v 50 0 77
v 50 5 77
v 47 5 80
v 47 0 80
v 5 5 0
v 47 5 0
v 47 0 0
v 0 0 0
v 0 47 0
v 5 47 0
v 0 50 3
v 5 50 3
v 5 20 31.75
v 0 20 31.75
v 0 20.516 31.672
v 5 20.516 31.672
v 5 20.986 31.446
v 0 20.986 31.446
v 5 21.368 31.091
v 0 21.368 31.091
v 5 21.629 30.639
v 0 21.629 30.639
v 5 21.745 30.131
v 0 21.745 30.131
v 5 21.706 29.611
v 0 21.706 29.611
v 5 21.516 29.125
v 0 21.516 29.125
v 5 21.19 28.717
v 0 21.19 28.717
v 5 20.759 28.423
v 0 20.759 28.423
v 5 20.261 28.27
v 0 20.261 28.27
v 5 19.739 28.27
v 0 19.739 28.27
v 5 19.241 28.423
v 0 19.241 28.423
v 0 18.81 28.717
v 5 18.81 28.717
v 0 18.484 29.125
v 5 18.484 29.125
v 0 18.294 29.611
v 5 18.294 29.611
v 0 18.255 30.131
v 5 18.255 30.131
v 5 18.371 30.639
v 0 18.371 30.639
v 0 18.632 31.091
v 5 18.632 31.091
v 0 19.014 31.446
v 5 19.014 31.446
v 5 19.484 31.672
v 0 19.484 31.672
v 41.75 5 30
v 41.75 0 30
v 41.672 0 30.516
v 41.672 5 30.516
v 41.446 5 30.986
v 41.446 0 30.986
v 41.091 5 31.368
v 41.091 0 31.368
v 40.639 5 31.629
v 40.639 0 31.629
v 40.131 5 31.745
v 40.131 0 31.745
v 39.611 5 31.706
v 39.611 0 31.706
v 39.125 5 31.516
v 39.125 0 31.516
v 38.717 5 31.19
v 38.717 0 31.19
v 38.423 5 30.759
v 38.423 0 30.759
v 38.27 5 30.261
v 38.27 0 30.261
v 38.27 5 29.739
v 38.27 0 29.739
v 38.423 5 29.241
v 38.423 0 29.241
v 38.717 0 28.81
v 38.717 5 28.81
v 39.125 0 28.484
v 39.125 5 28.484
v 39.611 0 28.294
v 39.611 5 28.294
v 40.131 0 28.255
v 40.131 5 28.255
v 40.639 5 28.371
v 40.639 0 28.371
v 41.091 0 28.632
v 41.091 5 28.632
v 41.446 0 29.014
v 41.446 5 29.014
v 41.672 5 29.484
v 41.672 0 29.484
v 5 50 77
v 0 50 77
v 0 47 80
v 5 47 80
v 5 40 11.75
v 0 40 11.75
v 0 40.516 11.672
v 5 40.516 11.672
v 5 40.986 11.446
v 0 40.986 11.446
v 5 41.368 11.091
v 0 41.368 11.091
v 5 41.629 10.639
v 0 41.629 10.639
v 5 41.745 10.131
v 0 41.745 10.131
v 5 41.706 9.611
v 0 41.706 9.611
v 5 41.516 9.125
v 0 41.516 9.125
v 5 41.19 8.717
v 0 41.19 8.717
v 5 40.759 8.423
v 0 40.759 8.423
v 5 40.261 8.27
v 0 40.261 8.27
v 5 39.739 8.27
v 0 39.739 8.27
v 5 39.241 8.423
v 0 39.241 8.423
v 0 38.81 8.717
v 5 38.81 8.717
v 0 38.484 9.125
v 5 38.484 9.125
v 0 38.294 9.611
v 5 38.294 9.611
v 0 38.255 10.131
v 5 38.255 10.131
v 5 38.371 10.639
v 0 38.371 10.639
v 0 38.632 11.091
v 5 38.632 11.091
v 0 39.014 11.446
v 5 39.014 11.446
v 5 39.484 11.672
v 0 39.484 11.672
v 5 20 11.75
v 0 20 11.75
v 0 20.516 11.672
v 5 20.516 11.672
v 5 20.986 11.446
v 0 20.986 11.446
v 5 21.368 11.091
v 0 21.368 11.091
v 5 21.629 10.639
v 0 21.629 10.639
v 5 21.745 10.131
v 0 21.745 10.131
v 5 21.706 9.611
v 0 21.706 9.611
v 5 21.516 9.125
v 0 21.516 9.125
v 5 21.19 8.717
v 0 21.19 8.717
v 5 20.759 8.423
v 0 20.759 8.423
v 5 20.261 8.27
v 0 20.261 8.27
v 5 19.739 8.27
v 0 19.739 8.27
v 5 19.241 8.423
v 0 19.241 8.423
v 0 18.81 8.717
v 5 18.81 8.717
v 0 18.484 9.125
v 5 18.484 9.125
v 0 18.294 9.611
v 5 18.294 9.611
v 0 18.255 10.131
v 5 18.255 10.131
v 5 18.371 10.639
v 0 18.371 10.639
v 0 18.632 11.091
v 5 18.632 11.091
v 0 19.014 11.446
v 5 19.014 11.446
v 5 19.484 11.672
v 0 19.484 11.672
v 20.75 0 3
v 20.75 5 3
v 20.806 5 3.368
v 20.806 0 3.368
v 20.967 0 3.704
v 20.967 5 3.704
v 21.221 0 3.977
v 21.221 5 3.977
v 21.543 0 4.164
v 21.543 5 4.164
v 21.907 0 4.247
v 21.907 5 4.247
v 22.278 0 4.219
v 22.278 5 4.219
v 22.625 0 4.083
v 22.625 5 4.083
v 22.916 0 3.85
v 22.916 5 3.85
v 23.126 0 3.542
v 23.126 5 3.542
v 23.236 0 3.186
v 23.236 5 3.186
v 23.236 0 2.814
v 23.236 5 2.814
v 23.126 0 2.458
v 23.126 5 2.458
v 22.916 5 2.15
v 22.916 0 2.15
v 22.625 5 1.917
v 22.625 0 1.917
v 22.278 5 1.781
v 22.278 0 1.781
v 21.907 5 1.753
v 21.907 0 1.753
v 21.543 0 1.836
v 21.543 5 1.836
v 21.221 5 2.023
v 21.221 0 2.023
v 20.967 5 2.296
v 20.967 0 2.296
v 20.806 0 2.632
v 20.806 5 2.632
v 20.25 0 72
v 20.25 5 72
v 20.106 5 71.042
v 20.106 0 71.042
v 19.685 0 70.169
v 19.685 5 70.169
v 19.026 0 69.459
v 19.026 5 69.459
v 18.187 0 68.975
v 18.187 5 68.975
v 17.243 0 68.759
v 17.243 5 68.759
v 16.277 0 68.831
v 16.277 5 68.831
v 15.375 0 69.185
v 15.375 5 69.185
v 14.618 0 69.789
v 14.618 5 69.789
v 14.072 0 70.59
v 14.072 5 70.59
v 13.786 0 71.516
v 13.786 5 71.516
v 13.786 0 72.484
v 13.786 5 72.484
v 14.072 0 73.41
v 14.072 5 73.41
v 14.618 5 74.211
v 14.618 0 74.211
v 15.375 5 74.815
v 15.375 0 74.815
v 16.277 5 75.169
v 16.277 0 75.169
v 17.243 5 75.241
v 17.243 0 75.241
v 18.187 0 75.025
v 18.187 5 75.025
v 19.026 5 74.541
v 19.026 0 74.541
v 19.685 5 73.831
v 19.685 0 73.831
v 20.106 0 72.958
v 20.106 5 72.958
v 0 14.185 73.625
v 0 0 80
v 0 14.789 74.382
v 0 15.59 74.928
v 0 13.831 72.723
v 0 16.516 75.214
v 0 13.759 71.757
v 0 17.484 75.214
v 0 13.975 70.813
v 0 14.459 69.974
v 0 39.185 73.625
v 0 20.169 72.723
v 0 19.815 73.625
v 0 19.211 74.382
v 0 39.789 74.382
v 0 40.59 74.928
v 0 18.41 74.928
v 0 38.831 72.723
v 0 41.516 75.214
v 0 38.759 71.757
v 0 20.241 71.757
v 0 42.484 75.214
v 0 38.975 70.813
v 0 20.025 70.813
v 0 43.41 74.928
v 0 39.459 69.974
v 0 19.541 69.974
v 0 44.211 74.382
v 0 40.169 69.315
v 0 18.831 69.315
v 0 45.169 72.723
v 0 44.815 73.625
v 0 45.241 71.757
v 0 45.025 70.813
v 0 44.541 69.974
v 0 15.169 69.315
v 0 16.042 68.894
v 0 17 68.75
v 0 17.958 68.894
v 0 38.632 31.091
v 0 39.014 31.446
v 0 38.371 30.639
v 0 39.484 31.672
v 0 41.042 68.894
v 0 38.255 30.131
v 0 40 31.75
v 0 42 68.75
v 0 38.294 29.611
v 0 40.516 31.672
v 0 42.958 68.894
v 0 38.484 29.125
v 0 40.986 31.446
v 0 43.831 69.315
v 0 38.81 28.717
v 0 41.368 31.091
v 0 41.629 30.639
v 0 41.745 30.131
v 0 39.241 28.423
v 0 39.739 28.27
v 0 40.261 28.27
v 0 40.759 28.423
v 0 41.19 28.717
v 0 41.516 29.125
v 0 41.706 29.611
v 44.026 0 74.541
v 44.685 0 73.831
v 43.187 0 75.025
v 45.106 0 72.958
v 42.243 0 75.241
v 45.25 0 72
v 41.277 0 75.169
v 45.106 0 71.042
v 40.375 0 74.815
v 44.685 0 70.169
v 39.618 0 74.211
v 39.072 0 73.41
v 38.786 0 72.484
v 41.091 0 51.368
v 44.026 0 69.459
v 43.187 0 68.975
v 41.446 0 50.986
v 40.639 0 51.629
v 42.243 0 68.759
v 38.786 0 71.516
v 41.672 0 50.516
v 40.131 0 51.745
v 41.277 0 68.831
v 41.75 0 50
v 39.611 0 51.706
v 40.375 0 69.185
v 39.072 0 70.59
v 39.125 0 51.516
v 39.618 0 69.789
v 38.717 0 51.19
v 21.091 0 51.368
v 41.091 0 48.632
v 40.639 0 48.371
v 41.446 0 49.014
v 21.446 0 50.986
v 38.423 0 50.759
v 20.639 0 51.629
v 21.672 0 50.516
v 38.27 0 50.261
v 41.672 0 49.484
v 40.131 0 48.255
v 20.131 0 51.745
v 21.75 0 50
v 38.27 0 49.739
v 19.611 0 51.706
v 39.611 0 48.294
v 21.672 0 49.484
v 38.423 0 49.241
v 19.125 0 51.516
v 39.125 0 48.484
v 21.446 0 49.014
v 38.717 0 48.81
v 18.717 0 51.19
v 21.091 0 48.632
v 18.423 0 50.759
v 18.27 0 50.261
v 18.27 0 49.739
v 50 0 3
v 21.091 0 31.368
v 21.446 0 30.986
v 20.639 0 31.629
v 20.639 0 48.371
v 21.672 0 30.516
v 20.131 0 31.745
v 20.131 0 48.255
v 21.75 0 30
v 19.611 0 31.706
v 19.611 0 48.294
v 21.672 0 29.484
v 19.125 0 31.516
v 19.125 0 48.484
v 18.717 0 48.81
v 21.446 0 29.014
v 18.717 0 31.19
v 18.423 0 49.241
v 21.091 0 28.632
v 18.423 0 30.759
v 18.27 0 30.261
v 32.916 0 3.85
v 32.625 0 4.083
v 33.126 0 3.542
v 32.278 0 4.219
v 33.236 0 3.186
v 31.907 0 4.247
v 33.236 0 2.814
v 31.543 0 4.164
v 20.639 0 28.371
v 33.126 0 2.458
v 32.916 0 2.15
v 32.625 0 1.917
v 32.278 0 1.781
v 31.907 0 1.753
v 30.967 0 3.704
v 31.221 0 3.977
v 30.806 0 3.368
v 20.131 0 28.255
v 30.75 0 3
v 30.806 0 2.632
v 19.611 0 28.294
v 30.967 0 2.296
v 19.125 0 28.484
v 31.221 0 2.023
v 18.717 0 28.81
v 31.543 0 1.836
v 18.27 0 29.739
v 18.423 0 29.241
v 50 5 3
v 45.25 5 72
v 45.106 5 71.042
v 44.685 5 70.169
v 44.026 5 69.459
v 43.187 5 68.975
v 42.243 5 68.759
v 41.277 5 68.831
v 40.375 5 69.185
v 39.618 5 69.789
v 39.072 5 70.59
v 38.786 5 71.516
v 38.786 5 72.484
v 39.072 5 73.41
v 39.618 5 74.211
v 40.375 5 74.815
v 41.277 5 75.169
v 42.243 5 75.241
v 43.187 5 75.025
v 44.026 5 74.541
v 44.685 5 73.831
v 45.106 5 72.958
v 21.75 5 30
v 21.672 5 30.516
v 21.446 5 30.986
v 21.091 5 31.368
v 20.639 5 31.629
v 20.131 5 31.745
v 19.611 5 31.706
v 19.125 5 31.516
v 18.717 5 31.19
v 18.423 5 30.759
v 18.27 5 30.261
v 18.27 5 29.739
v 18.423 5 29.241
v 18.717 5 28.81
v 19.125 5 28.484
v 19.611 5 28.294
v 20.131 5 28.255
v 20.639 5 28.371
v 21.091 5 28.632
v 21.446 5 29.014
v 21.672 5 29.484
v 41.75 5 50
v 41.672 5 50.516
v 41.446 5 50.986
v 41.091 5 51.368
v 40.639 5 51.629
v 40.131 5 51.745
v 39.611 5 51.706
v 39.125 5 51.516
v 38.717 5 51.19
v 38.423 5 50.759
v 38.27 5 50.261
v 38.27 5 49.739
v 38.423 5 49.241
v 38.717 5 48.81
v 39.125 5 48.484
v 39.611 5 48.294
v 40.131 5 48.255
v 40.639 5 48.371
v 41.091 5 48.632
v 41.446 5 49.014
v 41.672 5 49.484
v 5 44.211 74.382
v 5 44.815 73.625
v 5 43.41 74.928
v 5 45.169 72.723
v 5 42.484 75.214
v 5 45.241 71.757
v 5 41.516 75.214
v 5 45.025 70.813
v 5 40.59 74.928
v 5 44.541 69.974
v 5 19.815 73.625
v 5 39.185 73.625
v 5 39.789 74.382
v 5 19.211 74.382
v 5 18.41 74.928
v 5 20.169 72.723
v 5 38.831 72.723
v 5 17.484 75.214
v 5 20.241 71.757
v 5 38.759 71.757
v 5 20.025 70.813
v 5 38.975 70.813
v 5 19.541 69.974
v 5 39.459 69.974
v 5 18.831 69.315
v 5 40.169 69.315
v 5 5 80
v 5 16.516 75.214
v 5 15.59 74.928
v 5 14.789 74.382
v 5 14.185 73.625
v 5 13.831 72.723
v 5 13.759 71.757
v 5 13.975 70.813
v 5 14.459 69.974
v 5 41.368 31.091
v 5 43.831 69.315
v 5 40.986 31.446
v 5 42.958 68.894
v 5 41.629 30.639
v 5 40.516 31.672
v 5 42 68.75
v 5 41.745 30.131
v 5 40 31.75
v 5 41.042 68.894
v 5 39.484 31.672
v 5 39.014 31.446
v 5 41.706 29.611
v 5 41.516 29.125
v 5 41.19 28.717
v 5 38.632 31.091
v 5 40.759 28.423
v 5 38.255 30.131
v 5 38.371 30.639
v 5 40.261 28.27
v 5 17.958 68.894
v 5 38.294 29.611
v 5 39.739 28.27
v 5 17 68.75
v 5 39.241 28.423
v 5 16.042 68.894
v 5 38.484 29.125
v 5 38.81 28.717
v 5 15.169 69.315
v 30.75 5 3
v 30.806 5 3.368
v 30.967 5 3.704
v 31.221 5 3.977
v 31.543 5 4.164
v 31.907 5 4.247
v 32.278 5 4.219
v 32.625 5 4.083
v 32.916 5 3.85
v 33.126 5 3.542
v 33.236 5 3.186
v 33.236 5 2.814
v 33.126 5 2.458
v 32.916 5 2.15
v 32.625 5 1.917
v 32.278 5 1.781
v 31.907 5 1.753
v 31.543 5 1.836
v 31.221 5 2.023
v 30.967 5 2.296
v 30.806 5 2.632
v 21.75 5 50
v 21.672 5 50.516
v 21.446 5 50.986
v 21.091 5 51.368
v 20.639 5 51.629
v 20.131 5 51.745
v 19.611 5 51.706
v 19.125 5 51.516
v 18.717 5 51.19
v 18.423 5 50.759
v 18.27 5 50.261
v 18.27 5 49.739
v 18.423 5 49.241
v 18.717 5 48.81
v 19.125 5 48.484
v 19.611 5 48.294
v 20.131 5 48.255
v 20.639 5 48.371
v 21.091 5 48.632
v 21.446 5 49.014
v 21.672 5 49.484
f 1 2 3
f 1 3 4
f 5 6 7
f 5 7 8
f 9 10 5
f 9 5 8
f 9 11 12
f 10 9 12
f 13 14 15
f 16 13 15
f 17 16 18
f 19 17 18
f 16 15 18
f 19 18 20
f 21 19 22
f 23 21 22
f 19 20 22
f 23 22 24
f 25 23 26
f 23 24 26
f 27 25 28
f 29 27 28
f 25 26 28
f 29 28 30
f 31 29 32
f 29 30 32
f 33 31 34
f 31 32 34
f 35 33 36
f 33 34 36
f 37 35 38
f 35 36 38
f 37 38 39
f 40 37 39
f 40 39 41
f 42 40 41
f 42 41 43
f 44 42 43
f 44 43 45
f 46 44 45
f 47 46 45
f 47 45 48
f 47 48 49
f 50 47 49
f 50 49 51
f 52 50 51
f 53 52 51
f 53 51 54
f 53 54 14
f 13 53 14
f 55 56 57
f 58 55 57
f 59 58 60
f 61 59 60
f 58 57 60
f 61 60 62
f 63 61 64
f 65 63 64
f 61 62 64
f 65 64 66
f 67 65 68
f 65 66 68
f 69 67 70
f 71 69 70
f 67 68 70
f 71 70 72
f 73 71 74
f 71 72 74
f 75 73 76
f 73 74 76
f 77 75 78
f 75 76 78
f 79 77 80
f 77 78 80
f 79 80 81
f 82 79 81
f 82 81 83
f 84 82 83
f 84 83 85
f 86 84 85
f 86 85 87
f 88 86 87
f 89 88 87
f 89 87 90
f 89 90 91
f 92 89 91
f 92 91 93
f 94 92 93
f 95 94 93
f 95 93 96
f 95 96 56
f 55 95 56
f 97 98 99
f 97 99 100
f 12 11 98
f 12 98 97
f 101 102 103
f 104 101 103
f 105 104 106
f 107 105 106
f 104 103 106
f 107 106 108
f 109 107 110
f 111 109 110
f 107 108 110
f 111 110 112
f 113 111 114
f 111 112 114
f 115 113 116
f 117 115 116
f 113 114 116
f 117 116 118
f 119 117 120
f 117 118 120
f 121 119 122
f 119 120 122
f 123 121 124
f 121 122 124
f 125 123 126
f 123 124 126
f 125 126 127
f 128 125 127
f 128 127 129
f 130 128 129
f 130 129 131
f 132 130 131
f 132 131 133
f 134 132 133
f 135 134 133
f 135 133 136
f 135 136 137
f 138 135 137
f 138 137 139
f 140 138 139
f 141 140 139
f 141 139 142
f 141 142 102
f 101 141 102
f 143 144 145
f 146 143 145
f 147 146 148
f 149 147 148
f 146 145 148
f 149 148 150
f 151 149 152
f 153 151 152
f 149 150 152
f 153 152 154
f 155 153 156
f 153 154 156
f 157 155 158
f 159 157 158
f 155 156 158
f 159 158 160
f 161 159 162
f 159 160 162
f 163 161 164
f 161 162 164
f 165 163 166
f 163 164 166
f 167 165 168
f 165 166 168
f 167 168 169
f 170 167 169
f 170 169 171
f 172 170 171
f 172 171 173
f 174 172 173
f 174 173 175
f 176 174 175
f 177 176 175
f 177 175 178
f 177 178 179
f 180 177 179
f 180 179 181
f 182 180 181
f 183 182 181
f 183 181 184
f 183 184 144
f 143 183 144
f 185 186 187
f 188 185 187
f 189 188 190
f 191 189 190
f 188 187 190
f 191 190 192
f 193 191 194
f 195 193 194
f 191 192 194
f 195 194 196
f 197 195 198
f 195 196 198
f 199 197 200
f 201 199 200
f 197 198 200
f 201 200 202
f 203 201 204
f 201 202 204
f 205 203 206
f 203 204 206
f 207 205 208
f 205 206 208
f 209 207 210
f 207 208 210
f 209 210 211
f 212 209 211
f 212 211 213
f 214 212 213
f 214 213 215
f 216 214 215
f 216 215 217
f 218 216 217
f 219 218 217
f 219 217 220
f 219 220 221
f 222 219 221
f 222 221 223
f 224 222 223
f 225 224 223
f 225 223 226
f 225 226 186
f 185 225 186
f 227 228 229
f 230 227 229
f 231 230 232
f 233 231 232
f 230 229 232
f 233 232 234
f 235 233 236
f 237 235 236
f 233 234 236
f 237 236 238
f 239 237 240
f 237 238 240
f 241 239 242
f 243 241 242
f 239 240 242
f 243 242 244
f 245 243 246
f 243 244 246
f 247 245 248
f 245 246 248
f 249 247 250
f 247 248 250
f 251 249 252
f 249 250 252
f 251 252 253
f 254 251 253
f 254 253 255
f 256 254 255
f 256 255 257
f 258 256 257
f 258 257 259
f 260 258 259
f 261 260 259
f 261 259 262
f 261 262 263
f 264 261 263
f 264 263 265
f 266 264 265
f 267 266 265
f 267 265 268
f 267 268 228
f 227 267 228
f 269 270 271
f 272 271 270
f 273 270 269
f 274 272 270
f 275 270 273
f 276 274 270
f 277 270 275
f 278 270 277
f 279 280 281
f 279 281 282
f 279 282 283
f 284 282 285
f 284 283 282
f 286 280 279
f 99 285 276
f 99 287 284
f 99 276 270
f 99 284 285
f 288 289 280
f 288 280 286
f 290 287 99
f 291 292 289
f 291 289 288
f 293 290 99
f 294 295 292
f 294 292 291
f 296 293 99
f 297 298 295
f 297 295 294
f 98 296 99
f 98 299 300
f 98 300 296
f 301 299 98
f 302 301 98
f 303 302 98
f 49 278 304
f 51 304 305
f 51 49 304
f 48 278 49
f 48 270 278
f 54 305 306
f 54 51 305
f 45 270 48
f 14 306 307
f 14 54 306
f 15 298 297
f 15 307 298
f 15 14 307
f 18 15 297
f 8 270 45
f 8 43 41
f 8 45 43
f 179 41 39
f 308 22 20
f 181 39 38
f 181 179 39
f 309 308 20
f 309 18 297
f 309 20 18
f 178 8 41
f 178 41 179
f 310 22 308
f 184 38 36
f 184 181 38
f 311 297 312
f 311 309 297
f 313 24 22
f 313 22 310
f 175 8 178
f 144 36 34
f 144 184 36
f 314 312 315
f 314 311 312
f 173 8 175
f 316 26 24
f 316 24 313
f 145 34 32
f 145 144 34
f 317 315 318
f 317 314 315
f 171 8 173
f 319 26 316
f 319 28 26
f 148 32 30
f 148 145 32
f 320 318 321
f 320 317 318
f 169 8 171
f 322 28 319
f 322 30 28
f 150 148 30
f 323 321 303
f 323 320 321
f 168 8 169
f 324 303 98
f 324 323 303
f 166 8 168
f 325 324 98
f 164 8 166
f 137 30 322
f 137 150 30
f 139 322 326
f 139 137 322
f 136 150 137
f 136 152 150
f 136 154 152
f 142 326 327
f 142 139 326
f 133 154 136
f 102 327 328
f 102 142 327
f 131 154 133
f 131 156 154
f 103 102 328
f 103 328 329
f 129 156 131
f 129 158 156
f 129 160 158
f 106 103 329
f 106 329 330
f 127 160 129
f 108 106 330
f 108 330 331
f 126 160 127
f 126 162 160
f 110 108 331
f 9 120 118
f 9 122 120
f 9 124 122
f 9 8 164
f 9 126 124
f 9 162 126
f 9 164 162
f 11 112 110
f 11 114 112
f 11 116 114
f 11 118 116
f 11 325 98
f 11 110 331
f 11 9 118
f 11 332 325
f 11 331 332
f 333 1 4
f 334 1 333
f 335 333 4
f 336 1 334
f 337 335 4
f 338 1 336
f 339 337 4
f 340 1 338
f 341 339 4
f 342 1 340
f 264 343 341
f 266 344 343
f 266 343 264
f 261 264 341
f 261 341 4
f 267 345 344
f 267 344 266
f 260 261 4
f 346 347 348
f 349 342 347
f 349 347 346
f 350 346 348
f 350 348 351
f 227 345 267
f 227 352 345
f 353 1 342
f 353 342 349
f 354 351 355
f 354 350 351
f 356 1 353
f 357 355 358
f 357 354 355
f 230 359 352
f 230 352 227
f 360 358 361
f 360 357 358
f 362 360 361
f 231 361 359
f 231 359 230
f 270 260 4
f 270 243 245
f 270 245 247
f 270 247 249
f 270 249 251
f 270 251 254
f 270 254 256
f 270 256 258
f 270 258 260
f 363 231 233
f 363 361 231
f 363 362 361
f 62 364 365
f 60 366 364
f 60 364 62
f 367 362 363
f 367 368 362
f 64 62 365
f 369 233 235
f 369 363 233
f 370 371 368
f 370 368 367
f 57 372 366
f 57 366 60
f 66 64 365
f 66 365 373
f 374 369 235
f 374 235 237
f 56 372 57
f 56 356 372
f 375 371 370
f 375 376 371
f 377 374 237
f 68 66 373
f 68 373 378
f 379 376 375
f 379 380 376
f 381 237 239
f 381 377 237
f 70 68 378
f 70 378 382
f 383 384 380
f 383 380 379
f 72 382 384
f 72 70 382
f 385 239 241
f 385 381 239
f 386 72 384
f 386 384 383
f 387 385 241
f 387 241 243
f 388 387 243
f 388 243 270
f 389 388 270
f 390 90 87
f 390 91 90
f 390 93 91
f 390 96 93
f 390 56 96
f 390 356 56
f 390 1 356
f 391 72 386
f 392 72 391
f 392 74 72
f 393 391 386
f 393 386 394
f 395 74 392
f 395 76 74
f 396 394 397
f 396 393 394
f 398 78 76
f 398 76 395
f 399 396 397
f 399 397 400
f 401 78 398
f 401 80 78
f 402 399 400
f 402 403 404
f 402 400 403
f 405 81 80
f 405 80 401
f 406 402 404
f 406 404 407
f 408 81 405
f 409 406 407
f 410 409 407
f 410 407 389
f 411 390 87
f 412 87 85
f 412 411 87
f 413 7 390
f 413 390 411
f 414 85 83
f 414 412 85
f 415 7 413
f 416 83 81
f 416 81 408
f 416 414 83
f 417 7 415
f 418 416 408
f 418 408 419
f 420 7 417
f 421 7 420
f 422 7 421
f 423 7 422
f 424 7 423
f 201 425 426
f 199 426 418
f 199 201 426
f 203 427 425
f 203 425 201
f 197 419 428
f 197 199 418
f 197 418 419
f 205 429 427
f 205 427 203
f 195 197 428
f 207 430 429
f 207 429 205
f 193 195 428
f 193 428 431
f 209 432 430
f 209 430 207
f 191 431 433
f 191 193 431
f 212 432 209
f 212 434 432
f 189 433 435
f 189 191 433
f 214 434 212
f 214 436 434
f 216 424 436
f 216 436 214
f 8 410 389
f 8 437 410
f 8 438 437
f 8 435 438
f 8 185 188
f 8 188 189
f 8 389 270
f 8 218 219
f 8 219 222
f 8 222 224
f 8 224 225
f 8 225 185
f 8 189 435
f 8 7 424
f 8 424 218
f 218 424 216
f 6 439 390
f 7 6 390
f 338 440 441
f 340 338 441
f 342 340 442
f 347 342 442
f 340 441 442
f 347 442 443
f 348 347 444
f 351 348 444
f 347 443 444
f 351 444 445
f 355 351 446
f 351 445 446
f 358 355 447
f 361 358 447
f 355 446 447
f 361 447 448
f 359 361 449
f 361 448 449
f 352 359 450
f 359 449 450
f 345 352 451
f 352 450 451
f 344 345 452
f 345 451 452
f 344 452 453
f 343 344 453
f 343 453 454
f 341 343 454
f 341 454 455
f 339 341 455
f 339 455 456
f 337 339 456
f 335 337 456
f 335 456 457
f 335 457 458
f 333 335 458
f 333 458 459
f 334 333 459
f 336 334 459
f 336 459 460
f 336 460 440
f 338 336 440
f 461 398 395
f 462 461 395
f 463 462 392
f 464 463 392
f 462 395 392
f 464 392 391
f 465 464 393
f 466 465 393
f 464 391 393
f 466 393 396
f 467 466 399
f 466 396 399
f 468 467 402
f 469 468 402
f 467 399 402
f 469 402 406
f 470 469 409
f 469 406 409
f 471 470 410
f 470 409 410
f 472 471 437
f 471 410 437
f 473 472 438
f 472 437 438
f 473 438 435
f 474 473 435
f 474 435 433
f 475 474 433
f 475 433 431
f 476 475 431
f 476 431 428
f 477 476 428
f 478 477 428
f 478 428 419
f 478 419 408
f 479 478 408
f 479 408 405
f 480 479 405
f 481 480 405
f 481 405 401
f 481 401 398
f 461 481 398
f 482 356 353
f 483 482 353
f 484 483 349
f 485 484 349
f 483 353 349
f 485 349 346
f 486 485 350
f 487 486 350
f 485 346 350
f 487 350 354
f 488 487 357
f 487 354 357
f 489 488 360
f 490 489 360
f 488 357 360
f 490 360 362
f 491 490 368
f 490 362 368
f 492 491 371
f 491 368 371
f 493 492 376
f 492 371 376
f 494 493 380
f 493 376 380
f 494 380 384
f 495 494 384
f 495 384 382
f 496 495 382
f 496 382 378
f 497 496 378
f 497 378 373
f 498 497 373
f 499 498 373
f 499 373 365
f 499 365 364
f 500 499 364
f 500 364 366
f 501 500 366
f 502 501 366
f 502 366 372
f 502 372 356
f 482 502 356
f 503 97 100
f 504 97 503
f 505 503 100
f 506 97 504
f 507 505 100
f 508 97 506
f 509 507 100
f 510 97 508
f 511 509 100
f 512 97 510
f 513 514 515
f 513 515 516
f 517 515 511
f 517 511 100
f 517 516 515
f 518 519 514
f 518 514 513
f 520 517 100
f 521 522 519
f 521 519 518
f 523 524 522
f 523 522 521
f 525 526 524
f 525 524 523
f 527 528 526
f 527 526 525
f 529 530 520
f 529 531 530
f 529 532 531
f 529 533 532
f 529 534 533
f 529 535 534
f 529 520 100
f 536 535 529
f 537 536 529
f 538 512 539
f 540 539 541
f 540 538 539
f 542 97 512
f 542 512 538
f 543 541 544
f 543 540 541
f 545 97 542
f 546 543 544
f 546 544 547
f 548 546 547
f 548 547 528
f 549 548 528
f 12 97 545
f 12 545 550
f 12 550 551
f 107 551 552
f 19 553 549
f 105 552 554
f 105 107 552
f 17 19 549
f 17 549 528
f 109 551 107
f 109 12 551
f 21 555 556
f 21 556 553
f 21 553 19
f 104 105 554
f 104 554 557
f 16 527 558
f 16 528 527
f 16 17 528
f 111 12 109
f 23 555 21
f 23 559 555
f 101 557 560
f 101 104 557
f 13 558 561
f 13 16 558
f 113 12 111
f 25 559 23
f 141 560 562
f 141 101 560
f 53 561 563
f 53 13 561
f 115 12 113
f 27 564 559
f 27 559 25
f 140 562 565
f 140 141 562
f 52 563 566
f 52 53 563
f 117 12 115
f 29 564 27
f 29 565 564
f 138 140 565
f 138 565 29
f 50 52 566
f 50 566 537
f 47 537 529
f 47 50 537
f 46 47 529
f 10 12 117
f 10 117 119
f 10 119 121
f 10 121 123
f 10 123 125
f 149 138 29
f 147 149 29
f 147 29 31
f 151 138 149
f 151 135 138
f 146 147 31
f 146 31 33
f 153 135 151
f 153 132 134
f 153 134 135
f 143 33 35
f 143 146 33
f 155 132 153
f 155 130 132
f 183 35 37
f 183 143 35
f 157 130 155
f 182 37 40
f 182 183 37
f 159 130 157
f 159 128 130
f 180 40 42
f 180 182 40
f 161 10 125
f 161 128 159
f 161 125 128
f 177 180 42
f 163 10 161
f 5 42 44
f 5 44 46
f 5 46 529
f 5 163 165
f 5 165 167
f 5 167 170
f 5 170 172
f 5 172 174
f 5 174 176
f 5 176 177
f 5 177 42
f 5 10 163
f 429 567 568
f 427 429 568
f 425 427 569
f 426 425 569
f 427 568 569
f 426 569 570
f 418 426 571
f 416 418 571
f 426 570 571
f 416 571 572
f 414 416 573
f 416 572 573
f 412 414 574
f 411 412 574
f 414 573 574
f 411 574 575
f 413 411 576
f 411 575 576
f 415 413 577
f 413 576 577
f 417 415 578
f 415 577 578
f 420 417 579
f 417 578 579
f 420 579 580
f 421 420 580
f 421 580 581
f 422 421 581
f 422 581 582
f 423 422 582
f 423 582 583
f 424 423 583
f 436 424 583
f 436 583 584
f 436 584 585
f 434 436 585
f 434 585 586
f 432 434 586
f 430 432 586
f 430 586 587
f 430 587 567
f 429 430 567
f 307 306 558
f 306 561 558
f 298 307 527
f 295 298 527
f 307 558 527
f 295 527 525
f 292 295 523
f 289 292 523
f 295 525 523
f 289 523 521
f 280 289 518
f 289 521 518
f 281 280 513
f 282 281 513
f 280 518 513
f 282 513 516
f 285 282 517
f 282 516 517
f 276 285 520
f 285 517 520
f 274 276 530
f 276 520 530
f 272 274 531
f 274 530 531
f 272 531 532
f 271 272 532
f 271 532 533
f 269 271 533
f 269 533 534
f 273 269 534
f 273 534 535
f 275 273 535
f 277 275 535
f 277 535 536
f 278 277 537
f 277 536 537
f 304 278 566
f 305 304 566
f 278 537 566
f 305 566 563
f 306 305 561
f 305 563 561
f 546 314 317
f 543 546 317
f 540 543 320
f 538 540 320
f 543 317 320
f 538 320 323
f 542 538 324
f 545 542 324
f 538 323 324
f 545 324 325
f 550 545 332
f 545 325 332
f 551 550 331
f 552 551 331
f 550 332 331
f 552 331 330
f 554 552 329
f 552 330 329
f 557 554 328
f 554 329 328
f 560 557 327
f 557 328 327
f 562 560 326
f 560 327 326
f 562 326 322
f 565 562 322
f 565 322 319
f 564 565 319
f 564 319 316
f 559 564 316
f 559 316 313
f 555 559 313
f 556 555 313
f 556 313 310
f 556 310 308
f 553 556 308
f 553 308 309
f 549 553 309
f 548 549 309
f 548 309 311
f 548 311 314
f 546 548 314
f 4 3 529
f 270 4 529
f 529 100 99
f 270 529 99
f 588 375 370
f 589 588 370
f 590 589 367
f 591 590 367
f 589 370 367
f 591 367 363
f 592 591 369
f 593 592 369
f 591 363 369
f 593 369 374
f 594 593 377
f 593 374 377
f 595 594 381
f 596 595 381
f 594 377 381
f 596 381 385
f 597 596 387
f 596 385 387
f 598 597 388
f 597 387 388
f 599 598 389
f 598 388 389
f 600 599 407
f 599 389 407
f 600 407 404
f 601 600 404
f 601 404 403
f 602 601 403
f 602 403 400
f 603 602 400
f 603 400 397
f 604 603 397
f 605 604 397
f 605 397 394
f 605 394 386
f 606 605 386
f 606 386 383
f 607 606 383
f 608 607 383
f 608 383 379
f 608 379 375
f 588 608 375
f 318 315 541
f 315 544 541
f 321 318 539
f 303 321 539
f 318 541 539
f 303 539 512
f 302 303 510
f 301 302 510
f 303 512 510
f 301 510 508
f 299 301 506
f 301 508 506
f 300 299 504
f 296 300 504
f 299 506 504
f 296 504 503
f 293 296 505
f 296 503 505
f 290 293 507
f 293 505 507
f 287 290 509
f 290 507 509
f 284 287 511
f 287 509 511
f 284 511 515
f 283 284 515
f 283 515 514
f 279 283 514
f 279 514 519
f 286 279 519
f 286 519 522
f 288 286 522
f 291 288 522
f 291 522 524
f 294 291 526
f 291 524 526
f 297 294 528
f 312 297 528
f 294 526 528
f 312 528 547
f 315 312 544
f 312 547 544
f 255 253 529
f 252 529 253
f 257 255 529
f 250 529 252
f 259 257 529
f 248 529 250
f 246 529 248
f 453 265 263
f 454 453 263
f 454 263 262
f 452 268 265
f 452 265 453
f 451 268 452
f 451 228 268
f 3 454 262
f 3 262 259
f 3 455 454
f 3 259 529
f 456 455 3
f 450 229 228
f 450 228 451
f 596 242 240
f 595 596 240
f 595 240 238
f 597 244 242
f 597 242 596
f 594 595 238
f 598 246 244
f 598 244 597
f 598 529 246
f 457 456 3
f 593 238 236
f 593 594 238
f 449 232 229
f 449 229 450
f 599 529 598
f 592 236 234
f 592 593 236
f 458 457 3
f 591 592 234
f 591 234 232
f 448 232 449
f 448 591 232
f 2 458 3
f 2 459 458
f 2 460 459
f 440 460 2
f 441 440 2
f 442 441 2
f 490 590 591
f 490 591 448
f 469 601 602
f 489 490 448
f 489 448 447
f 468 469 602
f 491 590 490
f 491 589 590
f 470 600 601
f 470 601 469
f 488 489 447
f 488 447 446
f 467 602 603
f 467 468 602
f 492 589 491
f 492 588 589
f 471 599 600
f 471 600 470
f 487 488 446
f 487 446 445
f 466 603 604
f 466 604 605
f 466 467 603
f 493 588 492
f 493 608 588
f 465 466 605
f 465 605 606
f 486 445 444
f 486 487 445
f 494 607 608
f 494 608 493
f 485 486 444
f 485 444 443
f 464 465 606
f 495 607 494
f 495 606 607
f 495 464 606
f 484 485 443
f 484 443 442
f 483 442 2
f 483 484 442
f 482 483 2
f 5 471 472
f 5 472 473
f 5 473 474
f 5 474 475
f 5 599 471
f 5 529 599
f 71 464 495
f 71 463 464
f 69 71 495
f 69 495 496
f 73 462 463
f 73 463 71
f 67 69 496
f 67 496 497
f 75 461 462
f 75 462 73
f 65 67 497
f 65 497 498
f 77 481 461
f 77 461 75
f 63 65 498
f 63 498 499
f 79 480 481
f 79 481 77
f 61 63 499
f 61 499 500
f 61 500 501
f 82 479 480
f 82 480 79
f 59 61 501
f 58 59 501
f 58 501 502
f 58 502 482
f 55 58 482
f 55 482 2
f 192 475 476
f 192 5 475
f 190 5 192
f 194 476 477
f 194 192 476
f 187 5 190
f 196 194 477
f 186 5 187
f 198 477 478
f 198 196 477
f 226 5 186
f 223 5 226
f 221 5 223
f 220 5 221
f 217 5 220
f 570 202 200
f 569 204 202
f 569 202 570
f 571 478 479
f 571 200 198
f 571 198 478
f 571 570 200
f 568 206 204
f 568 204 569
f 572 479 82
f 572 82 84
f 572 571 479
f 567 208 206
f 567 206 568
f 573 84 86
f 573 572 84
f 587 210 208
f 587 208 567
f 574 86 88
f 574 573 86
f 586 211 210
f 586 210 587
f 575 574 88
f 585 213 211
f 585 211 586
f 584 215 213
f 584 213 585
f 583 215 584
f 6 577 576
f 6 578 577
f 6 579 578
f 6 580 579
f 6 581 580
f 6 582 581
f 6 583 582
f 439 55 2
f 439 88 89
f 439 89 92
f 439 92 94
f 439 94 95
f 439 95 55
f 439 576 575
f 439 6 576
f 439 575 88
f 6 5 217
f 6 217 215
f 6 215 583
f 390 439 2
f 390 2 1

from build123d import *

# Parameters (mm, degrees)
ESTRUSIONE_ESTRUSIONE1_DEPTH = 80
FORO_6_5_6_5_1_D             = 6.5
FORO_6_5_6_5_2_D             = 6.5
FORO_6_5_6_5_2_DEPTH         = 5
FORO_6_5_6_5_2_TIP           = 1.952797012
TAGLIO_ESTRUSIONE3_REACH     = 108.771
SCHIZZO10_R                  = 1.75
TAGLIO_ESTRUSIONE4_REACH     = 108.771
SCHIZZO11_R                  = 1.75
SMUSSO1_SIZE                 = 3
TAGLIO_ESTRUSIONE5_REACH     = 106.523
SCHIZZO12_R                  = 1.25


with BuildPart() as part:
    # Schizzo1 → Estrusione-Estrusione1 (new body)
    with BuildSketch(Plane.XY):
        Polygon((0, 0), (0, 50), (5, 50), (5, 5), (50, 5), (50, 0), align=None)
    extrude(amount=ESTRUSIONE_ESTRUSIONE1_DEPTH)

    # Foro Ø6.5 (6.5)-1 (through all)
    with Locations(Plane(origin=(0, 0, 0), x_dir=(-1, 0, 0), z_dir=(0, -1, 0))):
        with Locations((-17, -72), (-42, -72)):
            Hole(FORO_6_5_6_5_1_D / 2)

    # Foro Ø6.5 (6.5)-2
    with Locations(Plane.ZY):
        with Locations((72, 42), (72, 17)):
            Hole(FORO_6_5_6_5_2_D / 2, depth=FORO_6_5_6_5_2_DEPTH)
            with Locations((0, 0, -(FORO_6_5_6_5_2_DEPTH + FORO_6_5_6_5_2_TIP / 2))):  # 118° drill point
                Cone(0, FORO_6_5_6_5_2_D / 2, FORO_6_5_6_5_2_TIP, mode=Mode.SUBTRACT)

    # Schizzo10 → Taglio-Estrusione3 (cut, up to next)
    with BuildSketch(Plane.ZY, mode=Mode.PRIVATE) as taglio_estrusione3_sk1:
        with Locations((10, 40)):
            Circle(SCHIZZO10_R)
    taglio_estrusione3_tool1 = extrude(taglio_estrusione3_sk1.sketch, amount=-TAGLIO_ESTRUSIONE3_REACH, mode=Mode.PRIVATE) & part.part
    # Schizzo10 → Taglio-Estrusione3 (cut, up to next)
    with BuildSketch(Plane.ZY, mode=Mode.PRIVATE) as taglio_estrusione3_sk2:
        with Locations((30, 40)):
            Circle(SCHIZZO10_R)
    taglio_estrusione3_tool2 = extrude(taglio_estrusione3_sk2.sketch, amount=-TAGLIO_ESTRUSIONE3_REACH, mode=Mode.PRIVATE) & part.part
    # Schizzo10 → Taglio-Estrusione3 (cut, up to next)
    with BuildSketch(Plane.ZY, mode=Mode.PRIVATE) as taglio_estrusione3_sk3:
        with Locations((30, 20)):
            Circle(SCHIZZO10_R)
    taglio_estrusione3_tool3 = extrude(taglio_estrusione3_sk3.sketch, amount=-TAGLIO_ESTRUSIONE3_REACH, mode=Mode.PRIVATE) & part.part
    # Schizzo10 → Taglio-Estrusione3 (cut, up to next)
    with BuildSketch(Plane.ZY, mode=Mode.PRIVATE) as taglio_estrusione3_sk4:
        with Locations((10, 20)):
            Circle(SCHIZZO10_R)
    taglio_estrusione3_tool4 = extrude(taglio_estrusione3_sk4.sketch, amount=-TAGLIO_ESTRUSIONE3_REACH, mode=Mode.PRIVATE) & part.part
    add(taglio_estrusione3_tool1.solids().sort_by_distance((0, 40, 10))[0], mode=Mode.SUBTRACT)
    add(taglio_estrusione3_tool2.solids().sort_by_distance((0, 40, 30))[0], mode=Mode.SUBTRACT)
    add(taglio_estrusione3_tool3.solids().sort_by_distance((0, 20, 30))[0], mode=Mode.SUBTRACT)
    add(taglio_estrusione3_tool4.solids().sort_by_distance((0, 20, 10))[0], mode=Mode.SUBTRACT)

    # Schizzo11 → Taglio-Estrusione4 (cut, up to next)
    with BuildSketch(Plane.XZ, mode=Mode.PRIVATE) as taglio_estrusione4_sk1:
        with Locations((20, 30)):
            Circle(SCHIZZO11_R)
    taglio_estrusione4_tool1 = extrude(taglio_estrusione4_sk1.sketch, amount=-TAGLIO_ESTRUSIONE4_REACH, mode=Mode.PRIVATE) & part.part
    # Schizzo11 → Taglio-Estrusione4 (cut, up to next)
    with BuildSketch(Plane.XZ, mode=Mode.PRIVATE) as taglio_estrusione4_sk2:
        with Locations((20, 50)):
            Circle(SCHIZZO11_R)
    taglio_estrusione4_tool2 = extrude(taglio_estrusione4_sk2.sketch, amount=-TAGLIO_ESTRUSIONE4_REACH, mode=Mode.PRIVATE) & part.part
    # Schizzo11 → Taglio-Estrusione4 (cut, up to next)
    with BuildSketch(Plane.XZ, mode=Mode.PRIVATE) as taglio_estrusione4_sk3:
        with Locations((40, 50)):
            Circle(SCHIZZO11_R)
    taglio_estrusione4_tool3 = extrude(taglio_estrusione4_sk3.sketch, amount=-TAGLIO_ESTRUSIONE4_REACH, mode=Mode.PRIVATE) & part.part
    # Schizzo11 → Taglio-Estrusione4 (cut, up to next)
    with BuildSketch(Plane.XZ, mode=Mode.PRIVATE) as taglio_estrusione4_sk4:
        with Locations((40, 30)):
            Circle(SCHIZZO11_R)
    taglio_estrusione4_tool4 = extrude(taglio_estrusione4_sk4.sketch, amount=-TAGLIO_ESTRUSIONE4_REACH, mode=Mode.PRIVATE) & part.part
    add(taglio_estrusione4_tool1.solids().sort_by_distance((20, 0, 30))[0], mode=Mode.SUBTRACT)
    add(taglio_estrusione4_tool2.solids().sort_by_distance((20, 0, 50))[0], mode=Mode.SUBTRACT)
    add(taglio_estrusione4_tool3.solids().sort_by_distance((40, 0, 50))[0], mode=Mode.SUBTRACT)
    add(taglio_estrusione4_tool4.solids().sort_by_distance((40, 0, 30))[0], mode=Mode.SUBTRACT)

    # Smusso1
    smusso1_edges = [part.edges().sort_by_distance(p)[0] for p in [
        (2.5, 50, 80),
        (2.5, 50, 0),
        (50, 2.5, 80),
        (50, 2.5, 0),
    ]]
    chamfer(smusso1_edges, length=SMUSSO1_SIZE)

    # Schizzo12 → Taglio-Estrusione5 (cut, up to next)
    with BuildSketch(Plane(origin=(0, 5, 0), x_dir=(1, 0, 0), z_dir=(0, 1, 0)), mode=Mode.PRIVATE) as taglio_estrusione5_sk1:
        with Locations(Location((32, -3, 0), (0, 0, 180))):
            Circle(SCHIZZO12_R)
    taglio_estrusione5_tool1 = extrude(taglio_estrusione5_sk1.sketch, amount=-TAGLIO_ESTRUSIONE5_REACH, mode=Mode.PRIVATE) & part.part
    # Schizzo12 → Taglio-Estrusione5 (cut, up to next)
    with BuildSketch(Plane(origin=(0, 5, 0), x_dir=(1, 0, 0), z_dir=(0, 1, 0)), mode=Mode.PRIVATE) as taglio_estrusione5_sk2:
        with Locations(Location((22, -3, 0), (0, 0, 180))):
            Circle(SCHIZZO12_R)
    taglio_estrusione5_tool2 = extrude(taglio_estrusione5_sk2.sketch, amount=-TAGLIO_ESTRUSIONE5_REACH, mode=Mode.PRIVATE) & part.part
    add(taglio_estrusione5_tool1.solids().sort_by_distance((32, 5, 3))[0], mode=Mode.SUBTRACT)
    add(taglio_estrusione5_tool2.solids().sort_by_distance((22, 5, 3))[0], mode=Mode.SUBTRACT)


solid = part.part
